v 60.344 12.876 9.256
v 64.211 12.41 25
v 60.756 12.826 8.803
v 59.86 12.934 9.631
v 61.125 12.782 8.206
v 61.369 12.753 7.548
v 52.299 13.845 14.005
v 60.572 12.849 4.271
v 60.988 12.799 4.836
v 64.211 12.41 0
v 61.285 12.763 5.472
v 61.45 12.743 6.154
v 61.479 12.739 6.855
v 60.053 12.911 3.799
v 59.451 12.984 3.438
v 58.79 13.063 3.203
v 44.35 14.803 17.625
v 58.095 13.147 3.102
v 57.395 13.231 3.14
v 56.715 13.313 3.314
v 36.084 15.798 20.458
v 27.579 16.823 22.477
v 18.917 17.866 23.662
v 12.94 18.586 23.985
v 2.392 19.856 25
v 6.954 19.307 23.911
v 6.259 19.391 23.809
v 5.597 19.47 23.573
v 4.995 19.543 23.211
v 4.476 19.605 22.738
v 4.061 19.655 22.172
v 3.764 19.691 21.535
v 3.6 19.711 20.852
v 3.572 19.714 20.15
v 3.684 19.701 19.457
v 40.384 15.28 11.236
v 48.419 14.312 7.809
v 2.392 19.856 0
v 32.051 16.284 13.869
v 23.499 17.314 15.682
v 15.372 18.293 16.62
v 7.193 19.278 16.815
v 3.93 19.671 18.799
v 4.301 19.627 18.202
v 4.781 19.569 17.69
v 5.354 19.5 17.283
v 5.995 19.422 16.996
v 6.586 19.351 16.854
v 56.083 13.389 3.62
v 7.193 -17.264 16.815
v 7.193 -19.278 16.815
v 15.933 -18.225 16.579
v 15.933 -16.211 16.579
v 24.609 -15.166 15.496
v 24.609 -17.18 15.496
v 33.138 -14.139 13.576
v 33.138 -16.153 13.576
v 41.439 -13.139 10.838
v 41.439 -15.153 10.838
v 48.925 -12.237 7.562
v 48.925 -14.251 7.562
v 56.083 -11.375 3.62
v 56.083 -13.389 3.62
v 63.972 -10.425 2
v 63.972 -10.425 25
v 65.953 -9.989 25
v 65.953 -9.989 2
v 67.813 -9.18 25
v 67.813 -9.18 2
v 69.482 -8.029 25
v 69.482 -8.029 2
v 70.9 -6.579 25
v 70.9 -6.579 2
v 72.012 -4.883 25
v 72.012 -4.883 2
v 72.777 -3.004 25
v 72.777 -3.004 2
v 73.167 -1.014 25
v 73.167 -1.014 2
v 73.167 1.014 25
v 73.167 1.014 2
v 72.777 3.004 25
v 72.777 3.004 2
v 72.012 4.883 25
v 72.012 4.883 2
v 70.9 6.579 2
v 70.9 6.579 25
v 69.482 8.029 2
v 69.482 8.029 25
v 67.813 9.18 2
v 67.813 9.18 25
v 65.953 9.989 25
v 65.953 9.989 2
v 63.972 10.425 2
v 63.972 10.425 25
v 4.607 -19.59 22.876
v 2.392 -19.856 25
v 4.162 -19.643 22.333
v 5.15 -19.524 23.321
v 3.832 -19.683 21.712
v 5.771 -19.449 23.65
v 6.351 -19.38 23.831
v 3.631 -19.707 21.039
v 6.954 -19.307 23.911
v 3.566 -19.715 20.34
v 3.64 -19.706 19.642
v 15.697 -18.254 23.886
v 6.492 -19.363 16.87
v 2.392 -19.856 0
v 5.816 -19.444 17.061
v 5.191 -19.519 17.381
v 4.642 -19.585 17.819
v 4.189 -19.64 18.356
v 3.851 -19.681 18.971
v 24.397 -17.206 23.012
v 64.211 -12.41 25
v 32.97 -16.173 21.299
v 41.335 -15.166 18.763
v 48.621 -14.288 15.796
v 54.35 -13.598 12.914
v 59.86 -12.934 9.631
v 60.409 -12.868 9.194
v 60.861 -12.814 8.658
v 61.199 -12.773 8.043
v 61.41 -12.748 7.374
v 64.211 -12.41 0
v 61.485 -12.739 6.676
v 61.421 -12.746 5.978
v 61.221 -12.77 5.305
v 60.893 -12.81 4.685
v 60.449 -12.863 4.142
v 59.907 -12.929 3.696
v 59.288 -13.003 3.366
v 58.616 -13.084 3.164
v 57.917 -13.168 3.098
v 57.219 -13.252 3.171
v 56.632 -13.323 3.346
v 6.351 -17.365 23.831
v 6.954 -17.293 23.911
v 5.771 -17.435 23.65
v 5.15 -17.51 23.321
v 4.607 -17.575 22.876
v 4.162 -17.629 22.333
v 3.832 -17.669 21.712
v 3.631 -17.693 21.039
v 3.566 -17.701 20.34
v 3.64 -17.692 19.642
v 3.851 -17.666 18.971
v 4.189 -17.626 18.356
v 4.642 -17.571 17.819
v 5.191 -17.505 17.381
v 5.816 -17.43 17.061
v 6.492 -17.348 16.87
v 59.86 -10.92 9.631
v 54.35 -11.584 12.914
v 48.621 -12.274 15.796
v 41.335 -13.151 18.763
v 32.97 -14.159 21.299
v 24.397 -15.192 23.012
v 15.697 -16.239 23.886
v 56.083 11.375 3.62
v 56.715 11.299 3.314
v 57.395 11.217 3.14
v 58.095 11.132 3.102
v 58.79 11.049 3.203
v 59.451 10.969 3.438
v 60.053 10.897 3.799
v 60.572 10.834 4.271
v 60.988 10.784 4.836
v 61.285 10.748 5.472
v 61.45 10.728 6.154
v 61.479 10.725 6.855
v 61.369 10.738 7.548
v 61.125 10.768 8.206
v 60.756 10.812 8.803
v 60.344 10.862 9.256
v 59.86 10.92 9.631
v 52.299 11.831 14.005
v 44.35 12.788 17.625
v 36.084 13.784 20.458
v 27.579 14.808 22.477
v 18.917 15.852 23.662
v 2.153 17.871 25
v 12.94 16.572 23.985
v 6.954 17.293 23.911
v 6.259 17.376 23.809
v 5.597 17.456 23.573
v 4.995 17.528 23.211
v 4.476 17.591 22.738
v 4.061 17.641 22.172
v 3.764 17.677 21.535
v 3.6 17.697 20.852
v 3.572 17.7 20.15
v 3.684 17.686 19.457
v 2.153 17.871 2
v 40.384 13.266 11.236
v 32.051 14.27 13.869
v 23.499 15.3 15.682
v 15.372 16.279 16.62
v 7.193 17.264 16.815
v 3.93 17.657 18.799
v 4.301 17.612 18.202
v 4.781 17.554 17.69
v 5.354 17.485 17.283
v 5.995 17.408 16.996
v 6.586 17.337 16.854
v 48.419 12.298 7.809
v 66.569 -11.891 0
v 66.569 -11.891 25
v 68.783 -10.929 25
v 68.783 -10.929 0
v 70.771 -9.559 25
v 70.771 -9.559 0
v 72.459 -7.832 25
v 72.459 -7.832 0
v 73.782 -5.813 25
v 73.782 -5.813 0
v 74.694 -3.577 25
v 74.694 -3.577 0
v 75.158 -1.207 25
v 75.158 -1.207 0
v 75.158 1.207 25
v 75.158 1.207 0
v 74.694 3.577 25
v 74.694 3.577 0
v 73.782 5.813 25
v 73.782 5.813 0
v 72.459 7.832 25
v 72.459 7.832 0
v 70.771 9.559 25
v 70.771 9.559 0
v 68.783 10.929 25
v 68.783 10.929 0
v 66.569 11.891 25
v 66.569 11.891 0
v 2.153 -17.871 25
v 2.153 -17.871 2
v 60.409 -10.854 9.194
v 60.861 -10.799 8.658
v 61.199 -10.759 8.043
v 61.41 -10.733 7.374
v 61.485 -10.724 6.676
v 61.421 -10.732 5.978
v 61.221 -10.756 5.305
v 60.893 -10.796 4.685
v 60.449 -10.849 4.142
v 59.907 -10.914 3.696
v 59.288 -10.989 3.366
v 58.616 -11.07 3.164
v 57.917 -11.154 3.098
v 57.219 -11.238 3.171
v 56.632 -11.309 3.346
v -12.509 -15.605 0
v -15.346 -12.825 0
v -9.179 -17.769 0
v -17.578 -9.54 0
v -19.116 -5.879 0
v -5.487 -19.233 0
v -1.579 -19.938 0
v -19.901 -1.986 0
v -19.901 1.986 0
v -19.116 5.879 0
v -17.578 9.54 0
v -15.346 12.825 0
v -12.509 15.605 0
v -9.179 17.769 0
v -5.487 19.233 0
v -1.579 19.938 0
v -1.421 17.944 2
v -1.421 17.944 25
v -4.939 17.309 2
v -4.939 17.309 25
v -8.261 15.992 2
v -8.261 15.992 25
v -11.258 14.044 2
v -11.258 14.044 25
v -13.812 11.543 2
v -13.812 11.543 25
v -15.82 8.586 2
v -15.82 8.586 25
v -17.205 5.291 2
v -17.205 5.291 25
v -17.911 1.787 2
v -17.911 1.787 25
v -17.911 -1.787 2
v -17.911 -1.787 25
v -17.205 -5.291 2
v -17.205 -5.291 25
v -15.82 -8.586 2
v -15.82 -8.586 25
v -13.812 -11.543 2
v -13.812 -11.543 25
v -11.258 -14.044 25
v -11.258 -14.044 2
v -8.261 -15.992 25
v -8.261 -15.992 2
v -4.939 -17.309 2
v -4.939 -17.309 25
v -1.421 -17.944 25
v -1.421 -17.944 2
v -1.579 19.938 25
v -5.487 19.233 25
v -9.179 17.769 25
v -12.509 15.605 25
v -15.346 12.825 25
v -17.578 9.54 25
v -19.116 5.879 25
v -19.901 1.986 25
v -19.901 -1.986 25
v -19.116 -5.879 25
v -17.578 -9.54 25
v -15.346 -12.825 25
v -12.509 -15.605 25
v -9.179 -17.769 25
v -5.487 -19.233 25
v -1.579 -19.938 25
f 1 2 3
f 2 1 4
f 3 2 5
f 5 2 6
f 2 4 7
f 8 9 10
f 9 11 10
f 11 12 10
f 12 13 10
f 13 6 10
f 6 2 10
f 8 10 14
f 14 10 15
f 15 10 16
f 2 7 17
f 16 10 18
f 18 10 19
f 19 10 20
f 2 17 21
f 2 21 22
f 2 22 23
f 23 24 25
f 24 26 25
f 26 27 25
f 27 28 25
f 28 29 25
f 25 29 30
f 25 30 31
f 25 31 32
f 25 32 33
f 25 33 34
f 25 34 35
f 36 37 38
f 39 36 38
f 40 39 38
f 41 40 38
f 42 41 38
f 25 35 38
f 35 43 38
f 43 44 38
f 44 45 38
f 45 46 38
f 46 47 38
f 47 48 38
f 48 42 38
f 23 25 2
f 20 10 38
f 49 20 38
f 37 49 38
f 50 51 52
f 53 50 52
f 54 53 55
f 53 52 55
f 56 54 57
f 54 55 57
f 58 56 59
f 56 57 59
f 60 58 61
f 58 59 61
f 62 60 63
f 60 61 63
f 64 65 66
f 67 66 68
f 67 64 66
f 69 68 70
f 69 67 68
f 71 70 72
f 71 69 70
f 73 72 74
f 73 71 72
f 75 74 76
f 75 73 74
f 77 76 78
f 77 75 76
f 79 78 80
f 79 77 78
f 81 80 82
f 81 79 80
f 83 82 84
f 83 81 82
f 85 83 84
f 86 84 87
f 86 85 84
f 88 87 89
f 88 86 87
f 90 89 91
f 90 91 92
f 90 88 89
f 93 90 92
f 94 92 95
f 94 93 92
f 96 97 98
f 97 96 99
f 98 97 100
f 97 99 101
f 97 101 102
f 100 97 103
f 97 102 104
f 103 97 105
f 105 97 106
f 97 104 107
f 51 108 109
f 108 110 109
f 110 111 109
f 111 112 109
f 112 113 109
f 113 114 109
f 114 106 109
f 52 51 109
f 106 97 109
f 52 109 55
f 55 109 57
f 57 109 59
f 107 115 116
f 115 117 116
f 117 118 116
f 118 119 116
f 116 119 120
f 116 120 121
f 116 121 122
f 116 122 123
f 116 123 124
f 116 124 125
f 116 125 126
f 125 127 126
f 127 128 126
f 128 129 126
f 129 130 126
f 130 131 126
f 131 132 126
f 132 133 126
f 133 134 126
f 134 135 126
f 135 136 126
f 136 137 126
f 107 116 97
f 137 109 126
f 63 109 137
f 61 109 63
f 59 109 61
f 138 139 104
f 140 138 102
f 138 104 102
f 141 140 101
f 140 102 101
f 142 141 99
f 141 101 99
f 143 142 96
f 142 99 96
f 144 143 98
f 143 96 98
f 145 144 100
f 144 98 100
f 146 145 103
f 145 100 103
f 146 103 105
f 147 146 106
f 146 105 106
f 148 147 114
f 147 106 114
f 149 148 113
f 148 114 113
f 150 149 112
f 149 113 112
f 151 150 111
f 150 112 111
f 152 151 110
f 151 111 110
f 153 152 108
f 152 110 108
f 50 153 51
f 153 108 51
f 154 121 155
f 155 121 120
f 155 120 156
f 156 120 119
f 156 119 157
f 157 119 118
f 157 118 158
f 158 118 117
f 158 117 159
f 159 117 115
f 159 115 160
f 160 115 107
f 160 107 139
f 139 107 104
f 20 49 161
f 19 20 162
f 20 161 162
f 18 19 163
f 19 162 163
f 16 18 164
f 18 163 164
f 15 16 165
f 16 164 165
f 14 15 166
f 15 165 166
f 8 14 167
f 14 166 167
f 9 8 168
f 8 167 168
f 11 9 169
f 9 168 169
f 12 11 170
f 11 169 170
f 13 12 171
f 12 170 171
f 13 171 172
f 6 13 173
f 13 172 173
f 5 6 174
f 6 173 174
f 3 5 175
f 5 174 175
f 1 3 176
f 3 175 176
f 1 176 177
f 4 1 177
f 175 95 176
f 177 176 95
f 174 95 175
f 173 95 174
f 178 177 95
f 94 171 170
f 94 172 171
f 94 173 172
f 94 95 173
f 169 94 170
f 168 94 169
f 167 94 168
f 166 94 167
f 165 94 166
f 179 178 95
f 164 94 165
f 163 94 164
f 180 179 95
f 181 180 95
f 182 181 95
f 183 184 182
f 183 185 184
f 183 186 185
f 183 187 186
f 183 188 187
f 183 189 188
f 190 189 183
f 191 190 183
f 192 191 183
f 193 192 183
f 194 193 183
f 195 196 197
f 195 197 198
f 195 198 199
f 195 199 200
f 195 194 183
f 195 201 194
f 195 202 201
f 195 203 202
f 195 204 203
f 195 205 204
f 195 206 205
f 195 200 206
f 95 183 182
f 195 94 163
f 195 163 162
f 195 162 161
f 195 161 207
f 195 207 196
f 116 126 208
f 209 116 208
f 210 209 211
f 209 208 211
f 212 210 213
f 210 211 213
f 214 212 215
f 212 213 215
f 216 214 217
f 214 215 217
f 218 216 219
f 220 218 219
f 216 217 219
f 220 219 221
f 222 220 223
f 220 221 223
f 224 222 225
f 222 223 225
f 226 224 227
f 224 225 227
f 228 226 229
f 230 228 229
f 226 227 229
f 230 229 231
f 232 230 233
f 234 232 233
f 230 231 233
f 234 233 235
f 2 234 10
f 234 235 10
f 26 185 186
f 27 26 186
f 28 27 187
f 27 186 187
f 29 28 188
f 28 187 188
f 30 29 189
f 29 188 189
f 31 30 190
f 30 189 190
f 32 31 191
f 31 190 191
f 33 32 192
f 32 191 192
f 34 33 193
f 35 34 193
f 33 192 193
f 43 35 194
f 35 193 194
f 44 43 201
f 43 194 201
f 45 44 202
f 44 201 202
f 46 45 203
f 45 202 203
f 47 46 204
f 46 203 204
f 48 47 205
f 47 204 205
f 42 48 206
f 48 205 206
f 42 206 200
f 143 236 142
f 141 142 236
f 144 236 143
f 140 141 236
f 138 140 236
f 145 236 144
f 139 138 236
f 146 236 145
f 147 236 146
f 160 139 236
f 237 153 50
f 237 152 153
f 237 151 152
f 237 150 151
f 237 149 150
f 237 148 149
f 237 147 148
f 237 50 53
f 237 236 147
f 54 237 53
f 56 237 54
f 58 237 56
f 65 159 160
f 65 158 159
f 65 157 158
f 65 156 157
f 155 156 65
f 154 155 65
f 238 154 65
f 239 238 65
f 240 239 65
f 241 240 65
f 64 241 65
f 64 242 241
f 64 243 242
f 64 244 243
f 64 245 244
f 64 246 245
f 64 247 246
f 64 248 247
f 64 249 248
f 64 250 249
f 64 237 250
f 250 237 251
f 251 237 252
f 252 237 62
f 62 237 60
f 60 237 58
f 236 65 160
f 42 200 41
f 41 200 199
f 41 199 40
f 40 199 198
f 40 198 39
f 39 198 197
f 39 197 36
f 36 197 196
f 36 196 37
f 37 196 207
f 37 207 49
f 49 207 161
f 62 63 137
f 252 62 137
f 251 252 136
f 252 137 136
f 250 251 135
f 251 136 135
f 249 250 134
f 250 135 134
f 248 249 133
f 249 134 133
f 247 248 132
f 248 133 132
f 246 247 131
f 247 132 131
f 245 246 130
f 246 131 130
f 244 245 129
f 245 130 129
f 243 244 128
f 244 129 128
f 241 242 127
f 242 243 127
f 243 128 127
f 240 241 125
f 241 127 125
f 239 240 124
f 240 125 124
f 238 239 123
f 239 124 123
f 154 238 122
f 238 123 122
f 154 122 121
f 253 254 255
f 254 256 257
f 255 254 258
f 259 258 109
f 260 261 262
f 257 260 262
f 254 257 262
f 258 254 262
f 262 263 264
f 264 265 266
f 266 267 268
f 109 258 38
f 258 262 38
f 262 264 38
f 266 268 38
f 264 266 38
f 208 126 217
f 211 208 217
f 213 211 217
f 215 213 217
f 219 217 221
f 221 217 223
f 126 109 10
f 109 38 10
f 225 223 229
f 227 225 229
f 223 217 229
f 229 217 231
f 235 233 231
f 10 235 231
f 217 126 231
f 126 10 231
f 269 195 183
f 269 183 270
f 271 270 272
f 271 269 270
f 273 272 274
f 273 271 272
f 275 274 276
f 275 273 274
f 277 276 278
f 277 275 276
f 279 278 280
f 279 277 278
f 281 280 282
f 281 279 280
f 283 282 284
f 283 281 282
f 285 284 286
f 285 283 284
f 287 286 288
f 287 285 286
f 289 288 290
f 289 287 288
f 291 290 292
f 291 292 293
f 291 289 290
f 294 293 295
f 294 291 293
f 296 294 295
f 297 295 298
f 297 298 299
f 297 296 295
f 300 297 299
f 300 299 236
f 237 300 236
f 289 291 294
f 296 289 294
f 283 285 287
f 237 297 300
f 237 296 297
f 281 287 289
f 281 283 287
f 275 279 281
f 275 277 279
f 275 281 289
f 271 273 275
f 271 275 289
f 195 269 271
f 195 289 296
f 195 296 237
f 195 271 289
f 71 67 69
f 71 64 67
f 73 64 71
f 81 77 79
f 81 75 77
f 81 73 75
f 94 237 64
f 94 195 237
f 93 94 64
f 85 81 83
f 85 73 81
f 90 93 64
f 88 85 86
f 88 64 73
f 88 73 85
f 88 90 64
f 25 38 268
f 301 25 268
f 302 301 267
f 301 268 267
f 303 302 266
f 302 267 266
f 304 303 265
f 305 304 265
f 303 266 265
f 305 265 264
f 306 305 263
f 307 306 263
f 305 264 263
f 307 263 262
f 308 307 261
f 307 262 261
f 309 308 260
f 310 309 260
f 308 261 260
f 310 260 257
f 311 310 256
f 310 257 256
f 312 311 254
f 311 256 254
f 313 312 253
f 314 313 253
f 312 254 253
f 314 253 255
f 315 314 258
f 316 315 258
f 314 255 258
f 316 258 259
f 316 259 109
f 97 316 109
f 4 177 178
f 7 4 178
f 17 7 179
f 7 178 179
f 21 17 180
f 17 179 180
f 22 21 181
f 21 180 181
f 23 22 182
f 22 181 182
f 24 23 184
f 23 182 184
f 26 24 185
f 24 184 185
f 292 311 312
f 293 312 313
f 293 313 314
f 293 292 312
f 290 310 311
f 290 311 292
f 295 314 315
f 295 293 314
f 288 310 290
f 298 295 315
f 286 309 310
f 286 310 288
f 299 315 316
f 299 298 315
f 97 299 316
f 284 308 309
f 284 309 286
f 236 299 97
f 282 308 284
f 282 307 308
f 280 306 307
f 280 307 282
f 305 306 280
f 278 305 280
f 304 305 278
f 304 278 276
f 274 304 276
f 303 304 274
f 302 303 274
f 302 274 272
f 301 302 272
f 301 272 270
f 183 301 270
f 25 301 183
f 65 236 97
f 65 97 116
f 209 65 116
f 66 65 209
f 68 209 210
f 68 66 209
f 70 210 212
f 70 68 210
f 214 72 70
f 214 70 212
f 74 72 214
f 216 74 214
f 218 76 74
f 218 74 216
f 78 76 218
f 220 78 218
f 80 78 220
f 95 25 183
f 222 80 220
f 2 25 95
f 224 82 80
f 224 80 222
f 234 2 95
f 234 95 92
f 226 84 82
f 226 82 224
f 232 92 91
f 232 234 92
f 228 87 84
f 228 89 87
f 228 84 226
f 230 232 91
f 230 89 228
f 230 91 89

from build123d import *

# Parameters (mm, degrees)
F1_DEPTH = 25
F2_T     = -2
F4_DEPTH = 20.3


with BuildPart() as f1:
    # F0 (on Top) → F1 (new body)
    with BuildSketch(Plane.XY):
        with BuildLine():
            Line((64.2109500094, 12.4102973465), (2.3917296289, 19.8564757543))
            ThreePointArc((2.3917296289, 19.8564757543), (-20, 0), (2.3917296289, -19.8564757543))
            Line((2.3917296289, -19.8564757543), (64.2109500094, -12.4102973465))
            ThreePointArc((64.2109500094, -12.4102973465), (75.2161189914, 0), (64.2109500094, 12.4102973465))
        make_face()
    extrude(amount=F1_DEPTH)

    # F2
    f2_openings = [f1.faces().sort_by_distance(p)[0] for p in [
        (24.189424, 0, 25),
    ]]
    offset(amount=F2_T, openings=f2_openings)

    # F3 (on Front) → F4 (cut, symmetric)
    with BuildSketch(Plane.XZ):
        with BuildLine():
            ThreePointArc((59.8595843924, 9.6312405885), (34.5198825437, 20.8955157603), (6.9537251321, 23.9107024015))
            ThreePointArc((6.9537251321, 23.9107024015), (3.5680113506, 20.244996686), (7.1925410007, 16.8152385285))
            ThreePointArc((7.1925410007, 16.8152385285), (32.5850479445, 13.7268921567), (56.0830972065, 3.6195199423))
            ThreePointArc((56.0830972065, 3.6195199423), (60.9410990793, 4.7598155213), (59.8595843924, 9.6312405885))
        make_face()
    extrude(amount=F4_DEPTH, both=True, mode=Mode.SUBTRACT)


solid = f1.part
